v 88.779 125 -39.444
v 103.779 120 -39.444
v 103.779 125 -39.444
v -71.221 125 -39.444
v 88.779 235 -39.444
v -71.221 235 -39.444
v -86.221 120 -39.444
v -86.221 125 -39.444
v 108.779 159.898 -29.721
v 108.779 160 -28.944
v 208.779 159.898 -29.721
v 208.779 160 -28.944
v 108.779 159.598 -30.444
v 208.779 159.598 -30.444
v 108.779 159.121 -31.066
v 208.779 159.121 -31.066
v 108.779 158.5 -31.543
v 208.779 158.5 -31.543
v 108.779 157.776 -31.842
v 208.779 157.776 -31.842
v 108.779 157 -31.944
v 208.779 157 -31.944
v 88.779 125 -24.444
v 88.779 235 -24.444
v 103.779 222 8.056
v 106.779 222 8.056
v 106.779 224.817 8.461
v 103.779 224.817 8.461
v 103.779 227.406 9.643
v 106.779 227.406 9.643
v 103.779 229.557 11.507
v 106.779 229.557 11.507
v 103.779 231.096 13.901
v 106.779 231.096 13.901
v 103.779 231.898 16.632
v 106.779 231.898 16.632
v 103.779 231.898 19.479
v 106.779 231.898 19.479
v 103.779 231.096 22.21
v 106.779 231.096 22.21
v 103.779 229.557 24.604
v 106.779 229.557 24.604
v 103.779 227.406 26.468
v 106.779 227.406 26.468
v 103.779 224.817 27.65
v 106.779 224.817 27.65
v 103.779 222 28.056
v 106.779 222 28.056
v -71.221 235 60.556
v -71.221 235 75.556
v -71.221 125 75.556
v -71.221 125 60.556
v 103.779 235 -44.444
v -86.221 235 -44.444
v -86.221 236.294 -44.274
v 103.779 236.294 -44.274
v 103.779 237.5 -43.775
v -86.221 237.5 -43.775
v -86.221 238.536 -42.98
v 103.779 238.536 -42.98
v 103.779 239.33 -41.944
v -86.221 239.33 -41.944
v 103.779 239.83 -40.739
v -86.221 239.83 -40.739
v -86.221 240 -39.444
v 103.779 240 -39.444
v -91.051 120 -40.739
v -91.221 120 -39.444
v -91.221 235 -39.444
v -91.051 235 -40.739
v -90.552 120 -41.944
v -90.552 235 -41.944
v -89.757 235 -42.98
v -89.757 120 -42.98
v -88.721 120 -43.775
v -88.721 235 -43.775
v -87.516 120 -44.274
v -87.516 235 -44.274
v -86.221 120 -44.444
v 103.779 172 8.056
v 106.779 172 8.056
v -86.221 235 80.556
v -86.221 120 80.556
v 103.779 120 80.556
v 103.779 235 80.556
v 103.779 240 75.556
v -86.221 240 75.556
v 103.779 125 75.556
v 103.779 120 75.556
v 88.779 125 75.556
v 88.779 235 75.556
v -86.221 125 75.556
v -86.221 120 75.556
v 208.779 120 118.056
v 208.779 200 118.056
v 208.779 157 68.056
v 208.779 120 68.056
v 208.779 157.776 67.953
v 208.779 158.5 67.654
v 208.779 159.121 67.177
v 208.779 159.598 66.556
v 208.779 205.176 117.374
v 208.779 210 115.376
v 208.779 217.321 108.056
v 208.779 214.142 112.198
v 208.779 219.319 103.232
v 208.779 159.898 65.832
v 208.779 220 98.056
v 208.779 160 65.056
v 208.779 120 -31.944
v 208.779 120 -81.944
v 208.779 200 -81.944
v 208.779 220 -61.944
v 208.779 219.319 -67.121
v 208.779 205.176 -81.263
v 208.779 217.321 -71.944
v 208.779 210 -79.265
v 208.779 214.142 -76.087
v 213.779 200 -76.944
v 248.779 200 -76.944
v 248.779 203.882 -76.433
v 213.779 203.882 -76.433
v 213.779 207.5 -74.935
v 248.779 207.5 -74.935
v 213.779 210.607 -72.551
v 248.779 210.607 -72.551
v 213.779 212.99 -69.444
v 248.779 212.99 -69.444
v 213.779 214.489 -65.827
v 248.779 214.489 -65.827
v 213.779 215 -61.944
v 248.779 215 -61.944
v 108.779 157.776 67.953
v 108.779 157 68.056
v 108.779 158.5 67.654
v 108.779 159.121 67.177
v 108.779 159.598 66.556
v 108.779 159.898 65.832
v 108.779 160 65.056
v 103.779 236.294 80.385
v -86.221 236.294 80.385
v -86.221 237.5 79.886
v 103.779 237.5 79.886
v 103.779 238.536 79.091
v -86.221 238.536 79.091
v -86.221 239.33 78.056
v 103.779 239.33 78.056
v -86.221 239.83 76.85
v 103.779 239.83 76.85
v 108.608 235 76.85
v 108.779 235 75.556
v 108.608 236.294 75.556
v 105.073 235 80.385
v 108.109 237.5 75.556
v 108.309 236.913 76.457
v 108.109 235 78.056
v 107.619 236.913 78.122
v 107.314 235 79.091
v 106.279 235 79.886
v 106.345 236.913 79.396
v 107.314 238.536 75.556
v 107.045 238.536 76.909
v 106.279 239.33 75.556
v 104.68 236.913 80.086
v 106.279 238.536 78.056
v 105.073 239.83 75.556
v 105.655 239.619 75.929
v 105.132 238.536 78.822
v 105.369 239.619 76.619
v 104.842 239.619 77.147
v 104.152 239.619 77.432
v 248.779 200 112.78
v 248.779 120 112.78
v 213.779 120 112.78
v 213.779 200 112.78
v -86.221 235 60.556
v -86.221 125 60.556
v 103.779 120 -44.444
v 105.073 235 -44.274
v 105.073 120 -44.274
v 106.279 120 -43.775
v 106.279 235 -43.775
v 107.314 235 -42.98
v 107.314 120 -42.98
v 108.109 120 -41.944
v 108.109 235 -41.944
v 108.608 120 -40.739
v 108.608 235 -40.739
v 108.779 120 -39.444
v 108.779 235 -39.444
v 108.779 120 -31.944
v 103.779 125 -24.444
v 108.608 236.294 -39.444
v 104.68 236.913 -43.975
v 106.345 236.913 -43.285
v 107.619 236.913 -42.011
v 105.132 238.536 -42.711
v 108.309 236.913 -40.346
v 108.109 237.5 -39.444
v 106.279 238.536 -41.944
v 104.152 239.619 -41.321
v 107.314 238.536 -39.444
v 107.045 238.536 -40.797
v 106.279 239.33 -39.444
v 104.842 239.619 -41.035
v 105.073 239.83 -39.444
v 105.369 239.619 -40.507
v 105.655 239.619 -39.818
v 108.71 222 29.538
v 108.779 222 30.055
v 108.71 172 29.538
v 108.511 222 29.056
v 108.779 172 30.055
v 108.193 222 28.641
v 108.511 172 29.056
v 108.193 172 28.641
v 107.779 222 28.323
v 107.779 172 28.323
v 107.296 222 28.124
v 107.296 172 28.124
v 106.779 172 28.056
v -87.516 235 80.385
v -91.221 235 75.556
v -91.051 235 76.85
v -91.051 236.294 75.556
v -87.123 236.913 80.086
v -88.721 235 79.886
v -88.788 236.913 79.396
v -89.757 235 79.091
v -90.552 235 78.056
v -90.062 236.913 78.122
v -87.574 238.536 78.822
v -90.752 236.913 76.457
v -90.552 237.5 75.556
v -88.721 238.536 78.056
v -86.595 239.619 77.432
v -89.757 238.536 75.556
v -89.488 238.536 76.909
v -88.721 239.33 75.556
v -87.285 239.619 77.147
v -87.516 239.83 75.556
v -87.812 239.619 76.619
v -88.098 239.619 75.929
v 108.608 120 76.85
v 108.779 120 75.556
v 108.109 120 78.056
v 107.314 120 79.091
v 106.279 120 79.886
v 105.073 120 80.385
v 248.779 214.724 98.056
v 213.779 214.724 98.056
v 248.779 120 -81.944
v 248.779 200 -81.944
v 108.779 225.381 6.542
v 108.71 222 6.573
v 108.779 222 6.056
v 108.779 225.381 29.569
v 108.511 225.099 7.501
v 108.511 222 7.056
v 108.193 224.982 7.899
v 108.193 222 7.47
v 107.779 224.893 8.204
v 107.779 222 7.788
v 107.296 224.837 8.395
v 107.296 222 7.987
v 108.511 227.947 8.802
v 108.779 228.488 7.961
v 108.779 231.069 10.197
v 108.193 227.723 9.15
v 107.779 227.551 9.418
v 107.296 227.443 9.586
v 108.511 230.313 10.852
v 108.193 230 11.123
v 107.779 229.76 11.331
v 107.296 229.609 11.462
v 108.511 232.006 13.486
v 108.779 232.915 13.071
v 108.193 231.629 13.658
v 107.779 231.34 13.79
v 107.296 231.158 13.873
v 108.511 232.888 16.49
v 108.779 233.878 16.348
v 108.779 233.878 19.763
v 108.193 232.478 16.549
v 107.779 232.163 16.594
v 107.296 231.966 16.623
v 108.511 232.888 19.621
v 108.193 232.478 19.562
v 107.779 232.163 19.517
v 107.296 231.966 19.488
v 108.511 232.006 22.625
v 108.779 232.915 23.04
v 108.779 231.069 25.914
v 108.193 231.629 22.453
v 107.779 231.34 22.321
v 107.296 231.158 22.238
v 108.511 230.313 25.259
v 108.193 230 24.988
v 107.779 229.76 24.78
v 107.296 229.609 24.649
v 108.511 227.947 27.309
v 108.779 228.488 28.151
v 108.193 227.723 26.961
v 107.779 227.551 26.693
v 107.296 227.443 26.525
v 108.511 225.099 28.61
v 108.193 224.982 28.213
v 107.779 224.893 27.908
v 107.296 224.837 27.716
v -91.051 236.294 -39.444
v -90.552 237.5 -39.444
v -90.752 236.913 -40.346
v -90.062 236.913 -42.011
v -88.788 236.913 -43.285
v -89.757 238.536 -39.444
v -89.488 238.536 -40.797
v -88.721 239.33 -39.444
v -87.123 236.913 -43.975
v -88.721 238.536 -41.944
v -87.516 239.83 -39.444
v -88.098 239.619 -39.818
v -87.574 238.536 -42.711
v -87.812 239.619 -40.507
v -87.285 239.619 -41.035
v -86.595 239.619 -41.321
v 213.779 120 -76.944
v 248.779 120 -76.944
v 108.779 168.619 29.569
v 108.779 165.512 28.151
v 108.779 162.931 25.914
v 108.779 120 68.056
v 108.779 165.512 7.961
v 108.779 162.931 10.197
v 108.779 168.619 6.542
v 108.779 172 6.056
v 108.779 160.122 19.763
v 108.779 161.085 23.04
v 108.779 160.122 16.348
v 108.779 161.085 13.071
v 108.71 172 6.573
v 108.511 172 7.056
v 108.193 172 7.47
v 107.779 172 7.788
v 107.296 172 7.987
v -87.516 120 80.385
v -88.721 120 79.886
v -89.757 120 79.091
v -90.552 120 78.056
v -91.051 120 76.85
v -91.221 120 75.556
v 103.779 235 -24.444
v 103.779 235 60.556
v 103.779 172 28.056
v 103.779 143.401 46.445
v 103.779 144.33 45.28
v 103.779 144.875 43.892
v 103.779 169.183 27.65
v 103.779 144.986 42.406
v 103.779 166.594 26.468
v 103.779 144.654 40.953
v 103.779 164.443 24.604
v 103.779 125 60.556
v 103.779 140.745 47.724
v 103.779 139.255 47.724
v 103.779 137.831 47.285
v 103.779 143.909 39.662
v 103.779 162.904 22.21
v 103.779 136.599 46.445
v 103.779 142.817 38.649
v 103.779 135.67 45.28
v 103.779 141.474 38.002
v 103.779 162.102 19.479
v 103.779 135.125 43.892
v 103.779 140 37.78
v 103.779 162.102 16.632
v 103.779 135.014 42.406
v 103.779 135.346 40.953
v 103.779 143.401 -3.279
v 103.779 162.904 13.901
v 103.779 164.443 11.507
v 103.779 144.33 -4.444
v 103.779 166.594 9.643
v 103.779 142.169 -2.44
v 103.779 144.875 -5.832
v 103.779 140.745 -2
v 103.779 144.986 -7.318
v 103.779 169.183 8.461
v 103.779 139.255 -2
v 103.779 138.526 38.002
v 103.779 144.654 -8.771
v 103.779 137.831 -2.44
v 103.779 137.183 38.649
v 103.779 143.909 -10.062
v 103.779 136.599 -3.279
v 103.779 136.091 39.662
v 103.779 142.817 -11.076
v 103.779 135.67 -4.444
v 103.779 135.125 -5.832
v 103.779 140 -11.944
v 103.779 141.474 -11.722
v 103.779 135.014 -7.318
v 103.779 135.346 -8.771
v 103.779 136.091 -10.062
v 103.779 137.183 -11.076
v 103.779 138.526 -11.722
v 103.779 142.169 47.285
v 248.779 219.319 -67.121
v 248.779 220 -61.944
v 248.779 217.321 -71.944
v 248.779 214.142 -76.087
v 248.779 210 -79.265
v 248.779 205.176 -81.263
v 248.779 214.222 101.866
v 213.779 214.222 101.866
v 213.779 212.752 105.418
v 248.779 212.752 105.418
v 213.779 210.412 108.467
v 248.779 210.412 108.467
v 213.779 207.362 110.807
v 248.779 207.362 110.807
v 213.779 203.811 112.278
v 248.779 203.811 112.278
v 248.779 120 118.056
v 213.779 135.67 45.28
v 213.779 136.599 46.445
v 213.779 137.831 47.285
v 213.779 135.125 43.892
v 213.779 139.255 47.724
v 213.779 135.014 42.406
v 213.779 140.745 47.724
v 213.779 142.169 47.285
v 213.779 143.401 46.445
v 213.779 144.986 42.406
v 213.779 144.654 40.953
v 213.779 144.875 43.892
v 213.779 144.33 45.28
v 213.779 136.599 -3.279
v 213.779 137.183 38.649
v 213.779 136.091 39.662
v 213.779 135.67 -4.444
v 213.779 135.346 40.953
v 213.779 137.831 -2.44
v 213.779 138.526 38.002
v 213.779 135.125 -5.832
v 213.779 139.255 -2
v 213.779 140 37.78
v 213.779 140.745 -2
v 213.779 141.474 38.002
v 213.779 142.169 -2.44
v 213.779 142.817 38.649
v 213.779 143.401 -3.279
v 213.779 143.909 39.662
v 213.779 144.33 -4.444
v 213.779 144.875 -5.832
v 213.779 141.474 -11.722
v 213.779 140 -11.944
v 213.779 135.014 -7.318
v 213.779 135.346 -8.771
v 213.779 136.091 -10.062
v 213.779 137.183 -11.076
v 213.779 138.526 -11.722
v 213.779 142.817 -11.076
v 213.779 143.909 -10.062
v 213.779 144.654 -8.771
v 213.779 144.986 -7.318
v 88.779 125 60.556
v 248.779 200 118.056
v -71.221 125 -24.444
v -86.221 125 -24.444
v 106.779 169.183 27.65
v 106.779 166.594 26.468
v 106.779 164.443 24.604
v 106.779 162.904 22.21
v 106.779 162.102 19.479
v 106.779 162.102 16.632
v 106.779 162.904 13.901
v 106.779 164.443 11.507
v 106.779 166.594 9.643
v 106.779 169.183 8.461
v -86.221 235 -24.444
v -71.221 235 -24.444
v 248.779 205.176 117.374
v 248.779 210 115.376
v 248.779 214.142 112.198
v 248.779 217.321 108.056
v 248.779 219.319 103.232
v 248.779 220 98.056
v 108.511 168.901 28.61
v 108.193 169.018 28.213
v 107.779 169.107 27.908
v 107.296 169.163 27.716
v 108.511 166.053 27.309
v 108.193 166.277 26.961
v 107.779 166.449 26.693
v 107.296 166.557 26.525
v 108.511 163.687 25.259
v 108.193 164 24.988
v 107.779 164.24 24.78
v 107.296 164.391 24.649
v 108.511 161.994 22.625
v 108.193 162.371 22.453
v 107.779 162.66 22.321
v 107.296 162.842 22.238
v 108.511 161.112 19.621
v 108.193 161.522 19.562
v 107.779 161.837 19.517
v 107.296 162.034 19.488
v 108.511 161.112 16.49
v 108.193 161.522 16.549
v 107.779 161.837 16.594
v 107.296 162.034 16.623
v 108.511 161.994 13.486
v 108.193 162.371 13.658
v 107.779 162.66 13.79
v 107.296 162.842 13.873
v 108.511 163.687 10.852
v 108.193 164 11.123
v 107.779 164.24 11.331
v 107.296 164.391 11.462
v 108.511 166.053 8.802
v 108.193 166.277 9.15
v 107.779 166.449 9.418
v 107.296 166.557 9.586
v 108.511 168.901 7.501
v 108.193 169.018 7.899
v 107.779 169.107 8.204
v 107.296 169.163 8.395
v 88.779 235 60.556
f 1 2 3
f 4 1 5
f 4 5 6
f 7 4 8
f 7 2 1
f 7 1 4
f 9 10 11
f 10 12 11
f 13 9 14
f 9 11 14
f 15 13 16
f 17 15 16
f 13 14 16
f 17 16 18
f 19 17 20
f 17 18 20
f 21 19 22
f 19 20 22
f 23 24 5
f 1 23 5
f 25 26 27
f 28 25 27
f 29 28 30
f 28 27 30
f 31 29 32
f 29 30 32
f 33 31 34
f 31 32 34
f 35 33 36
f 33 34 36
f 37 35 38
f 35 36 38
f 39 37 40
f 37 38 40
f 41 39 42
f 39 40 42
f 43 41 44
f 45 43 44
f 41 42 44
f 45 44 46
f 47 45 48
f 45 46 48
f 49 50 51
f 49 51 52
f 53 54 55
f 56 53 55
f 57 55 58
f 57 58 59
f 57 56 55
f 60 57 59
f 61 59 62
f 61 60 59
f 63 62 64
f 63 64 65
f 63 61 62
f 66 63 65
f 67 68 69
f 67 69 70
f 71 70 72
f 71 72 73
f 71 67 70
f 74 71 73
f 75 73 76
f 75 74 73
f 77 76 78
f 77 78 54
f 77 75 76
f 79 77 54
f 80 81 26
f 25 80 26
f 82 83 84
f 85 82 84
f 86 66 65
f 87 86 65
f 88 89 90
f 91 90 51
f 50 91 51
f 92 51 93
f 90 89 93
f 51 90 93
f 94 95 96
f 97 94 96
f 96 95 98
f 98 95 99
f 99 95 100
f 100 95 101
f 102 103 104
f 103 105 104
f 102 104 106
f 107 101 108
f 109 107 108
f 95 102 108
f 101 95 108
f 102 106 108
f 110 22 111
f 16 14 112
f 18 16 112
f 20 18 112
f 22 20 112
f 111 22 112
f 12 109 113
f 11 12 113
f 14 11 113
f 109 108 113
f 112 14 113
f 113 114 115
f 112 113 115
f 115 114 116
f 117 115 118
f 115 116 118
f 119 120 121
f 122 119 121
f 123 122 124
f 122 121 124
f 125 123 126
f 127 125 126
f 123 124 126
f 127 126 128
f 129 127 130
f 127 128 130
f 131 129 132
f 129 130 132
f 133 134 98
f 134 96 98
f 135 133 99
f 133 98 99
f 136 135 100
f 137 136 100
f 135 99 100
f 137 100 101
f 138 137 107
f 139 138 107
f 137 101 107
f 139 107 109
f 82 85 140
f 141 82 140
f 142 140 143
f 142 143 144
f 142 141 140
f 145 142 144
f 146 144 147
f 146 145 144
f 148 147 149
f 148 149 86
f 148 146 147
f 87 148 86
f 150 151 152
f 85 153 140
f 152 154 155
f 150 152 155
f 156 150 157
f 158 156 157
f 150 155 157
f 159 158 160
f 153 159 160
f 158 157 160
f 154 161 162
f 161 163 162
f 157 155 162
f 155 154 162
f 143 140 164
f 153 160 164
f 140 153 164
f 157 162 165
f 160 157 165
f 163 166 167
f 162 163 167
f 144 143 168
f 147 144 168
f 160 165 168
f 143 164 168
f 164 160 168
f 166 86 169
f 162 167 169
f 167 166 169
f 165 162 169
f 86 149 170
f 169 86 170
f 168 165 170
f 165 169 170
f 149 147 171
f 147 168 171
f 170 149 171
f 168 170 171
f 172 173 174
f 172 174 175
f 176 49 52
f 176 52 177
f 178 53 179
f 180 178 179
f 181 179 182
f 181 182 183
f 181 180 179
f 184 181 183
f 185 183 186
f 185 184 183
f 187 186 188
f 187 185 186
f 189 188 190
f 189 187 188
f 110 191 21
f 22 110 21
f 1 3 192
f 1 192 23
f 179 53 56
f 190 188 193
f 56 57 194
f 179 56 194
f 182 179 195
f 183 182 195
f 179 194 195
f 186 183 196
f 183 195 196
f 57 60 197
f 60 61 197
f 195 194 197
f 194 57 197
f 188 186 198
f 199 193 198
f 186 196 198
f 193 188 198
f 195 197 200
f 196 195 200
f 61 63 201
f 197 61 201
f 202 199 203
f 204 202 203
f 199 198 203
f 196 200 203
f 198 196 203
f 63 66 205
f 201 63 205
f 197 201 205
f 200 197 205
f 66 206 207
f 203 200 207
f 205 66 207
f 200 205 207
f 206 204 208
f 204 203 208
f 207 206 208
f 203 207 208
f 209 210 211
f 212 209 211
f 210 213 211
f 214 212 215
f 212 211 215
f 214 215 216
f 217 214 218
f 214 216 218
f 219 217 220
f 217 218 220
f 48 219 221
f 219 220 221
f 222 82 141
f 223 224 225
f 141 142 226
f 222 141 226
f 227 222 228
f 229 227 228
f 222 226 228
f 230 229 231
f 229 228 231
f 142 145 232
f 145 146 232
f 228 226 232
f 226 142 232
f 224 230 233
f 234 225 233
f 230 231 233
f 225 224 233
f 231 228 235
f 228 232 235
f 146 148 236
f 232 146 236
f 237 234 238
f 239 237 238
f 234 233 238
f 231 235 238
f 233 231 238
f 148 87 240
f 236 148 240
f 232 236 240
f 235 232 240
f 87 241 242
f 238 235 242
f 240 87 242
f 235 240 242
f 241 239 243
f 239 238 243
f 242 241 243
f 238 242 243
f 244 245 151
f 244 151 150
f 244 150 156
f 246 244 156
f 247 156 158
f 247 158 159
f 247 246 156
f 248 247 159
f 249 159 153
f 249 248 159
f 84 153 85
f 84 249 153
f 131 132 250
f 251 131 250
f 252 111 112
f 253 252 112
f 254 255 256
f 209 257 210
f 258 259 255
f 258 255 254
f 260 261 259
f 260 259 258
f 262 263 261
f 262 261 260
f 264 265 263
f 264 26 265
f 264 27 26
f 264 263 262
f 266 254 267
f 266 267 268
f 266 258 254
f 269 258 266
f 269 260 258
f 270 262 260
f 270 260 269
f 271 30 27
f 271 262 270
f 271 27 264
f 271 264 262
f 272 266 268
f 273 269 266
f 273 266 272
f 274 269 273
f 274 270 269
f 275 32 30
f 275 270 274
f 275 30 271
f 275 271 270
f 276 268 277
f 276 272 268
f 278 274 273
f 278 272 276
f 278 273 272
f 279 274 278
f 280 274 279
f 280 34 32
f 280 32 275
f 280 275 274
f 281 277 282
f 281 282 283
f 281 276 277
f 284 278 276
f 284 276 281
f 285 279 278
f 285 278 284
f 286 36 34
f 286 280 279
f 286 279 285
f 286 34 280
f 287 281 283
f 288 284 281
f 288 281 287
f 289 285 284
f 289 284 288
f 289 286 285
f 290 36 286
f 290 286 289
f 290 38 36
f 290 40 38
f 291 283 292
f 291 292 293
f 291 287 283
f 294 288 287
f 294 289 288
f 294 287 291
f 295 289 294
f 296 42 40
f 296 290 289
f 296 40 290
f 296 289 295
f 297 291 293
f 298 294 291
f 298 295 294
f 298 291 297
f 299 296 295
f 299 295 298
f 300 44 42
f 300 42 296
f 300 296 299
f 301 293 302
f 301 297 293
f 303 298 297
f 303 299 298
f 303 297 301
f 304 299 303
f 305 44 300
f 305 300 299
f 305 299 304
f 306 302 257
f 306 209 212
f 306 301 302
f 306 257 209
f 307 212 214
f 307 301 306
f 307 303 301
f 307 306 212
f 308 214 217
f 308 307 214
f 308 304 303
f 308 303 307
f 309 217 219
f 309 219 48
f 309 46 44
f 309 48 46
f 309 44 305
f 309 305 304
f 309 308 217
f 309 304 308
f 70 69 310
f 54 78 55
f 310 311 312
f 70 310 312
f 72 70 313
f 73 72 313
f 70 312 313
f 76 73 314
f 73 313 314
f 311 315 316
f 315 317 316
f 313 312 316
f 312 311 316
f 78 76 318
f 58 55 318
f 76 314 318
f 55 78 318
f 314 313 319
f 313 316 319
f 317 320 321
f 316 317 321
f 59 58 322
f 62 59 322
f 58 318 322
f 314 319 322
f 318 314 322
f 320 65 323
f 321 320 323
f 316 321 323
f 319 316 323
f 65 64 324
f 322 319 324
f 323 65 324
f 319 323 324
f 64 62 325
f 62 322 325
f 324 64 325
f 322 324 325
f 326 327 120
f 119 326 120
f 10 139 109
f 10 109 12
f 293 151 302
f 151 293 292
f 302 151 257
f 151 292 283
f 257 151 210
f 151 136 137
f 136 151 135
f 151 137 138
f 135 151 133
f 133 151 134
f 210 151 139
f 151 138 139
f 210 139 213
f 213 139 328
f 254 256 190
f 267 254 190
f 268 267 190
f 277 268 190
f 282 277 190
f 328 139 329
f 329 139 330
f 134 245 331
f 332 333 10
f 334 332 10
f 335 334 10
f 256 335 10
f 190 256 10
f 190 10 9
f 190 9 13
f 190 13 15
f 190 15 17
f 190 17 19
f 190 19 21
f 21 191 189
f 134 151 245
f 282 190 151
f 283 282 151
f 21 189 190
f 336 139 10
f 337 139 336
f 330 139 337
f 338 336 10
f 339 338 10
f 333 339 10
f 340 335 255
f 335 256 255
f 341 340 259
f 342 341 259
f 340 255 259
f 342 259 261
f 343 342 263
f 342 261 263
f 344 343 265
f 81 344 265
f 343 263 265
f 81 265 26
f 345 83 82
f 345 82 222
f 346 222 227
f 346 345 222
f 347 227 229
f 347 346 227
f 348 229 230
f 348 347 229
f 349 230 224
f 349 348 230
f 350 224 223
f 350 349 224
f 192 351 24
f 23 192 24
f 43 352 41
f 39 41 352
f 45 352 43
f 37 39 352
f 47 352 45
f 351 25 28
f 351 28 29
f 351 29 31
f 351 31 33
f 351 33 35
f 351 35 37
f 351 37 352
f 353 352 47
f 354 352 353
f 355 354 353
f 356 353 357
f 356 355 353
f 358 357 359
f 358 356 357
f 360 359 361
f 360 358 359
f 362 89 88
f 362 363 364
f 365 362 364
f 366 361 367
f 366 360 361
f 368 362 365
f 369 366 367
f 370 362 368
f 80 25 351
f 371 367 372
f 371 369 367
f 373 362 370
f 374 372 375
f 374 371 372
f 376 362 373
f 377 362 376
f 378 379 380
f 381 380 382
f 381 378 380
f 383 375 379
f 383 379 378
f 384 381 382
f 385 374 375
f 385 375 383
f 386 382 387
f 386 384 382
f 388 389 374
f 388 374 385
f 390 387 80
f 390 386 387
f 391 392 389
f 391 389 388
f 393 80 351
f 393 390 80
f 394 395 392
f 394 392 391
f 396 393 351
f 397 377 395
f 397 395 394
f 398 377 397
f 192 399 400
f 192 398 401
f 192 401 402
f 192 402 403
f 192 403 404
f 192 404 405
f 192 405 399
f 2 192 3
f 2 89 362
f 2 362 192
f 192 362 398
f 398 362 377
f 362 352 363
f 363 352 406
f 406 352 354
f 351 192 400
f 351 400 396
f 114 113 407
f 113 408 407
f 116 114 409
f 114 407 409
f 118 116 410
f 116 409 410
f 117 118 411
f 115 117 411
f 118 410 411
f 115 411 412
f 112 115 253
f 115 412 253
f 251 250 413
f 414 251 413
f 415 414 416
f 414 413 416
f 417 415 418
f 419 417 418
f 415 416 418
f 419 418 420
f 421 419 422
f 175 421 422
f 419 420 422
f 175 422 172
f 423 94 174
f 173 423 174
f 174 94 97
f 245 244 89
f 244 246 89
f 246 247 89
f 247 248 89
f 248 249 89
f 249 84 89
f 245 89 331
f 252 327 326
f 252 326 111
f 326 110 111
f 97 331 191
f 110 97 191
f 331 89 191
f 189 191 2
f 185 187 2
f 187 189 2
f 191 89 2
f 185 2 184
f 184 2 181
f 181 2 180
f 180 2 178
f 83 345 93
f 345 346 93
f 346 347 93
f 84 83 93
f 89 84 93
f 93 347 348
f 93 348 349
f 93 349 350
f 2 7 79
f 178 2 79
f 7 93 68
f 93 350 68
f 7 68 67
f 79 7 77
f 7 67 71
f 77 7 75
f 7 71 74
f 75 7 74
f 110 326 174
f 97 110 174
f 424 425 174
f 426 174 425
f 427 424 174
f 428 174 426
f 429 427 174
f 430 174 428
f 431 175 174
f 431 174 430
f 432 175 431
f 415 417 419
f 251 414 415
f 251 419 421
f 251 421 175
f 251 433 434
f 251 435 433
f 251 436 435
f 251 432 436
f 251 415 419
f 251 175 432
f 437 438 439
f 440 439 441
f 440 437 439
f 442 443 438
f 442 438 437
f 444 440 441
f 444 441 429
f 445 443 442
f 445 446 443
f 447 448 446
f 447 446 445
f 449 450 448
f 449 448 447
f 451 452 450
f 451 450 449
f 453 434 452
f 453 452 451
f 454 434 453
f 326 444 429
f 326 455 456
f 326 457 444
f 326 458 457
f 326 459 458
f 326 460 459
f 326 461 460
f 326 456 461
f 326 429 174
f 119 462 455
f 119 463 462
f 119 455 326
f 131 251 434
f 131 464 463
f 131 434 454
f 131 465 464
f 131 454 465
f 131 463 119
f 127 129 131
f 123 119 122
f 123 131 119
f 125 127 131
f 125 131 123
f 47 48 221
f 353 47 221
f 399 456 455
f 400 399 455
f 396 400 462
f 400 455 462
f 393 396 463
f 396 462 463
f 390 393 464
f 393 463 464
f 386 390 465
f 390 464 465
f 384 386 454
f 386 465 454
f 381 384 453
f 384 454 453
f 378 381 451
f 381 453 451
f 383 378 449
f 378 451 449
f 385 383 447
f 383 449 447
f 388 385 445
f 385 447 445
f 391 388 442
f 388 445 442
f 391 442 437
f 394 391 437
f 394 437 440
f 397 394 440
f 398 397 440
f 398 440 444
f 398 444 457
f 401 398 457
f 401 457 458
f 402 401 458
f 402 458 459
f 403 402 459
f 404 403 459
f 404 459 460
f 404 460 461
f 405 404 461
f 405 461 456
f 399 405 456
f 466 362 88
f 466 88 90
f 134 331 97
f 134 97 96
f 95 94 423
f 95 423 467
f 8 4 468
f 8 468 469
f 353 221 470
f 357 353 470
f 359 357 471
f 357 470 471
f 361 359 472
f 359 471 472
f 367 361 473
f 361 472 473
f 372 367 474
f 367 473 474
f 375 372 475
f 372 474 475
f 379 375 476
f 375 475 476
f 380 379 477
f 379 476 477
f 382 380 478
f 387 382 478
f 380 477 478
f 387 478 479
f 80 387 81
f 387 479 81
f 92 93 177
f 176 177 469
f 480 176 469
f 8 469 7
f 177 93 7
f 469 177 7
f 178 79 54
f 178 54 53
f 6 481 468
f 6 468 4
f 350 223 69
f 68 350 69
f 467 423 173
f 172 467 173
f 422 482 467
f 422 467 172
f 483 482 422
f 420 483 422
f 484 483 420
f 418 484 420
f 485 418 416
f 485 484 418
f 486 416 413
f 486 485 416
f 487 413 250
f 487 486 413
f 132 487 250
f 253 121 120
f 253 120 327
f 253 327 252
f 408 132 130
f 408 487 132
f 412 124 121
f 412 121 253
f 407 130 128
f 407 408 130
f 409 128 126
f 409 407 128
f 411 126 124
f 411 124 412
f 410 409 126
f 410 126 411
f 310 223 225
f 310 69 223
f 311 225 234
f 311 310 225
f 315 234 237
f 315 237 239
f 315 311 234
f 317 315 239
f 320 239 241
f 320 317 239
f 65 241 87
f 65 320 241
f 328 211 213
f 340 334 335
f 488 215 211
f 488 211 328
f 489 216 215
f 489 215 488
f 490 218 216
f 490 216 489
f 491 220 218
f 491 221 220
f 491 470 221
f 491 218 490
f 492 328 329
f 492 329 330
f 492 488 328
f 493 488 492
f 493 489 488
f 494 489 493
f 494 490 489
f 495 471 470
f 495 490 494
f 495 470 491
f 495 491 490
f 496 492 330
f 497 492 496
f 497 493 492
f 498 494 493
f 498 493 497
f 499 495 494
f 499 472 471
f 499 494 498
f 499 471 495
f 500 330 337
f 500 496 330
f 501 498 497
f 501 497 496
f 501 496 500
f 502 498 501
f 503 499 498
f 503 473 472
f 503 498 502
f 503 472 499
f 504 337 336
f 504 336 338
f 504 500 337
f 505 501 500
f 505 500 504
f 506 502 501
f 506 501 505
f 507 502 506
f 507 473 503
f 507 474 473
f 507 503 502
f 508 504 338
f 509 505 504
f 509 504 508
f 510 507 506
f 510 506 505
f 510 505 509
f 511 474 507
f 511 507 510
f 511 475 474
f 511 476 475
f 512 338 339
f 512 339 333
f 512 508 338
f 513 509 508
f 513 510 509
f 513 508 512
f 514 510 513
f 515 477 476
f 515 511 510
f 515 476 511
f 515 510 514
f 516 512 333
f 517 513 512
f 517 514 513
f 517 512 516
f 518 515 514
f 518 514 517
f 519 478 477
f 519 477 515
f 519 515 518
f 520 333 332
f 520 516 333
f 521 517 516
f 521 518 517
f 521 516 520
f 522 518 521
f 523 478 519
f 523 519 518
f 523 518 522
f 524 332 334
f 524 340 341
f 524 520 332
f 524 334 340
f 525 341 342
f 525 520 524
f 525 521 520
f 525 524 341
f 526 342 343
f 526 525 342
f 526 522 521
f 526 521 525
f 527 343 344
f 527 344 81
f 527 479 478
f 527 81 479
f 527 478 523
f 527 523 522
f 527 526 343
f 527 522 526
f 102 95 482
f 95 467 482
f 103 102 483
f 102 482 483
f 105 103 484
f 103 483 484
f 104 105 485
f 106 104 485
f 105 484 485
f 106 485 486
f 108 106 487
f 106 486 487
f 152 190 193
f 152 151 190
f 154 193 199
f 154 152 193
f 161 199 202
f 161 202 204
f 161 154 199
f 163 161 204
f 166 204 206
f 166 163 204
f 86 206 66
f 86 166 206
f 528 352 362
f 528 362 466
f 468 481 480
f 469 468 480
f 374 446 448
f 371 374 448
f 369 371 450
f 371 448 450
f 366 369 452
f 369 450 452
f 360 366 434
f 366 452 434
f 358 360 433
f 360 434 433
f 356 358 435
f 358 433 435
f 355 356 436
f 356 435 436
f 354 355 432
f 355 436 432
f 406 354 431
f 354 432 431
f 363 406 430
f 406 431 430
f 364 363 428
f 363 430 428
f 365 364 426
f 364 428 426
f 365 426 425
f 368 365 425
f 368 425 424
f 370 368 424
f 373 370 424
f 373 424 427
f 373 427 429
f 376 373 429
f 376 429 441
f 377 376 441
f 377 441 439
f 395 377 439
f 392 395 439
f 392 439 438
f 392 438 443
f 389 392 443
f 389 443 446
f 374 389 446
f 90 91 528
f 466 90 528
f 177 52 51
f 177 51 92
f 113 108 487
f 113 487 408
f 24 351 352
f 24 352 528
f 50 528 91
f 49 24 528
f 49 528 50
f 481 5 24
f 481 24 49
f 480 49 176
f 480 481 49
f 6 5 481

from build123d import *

# Parameters (mm, degrees)
SKETCH1_W           = 200
SKETCH1_H           = 125
BOSS_EXTRUDE1_DEPTH = 120
BOSS_EXTRUDE2_DEPTH = 120
SKETCH3_W           = 200
SKETCH3_H           = 125
CUT_EXTRUDE1_DEPTH  = 120
FILLET1_R           = 5
SKETCH4_W           = 100
SKETCH4_H           = 40
BOSS_EXTRUDE3_DEPTH = 100
FILLET3_R           = 3
SKETCH5_W           = 190
SKETCH5_H           = 115
CUT_EXTRUDE2_DEPTH  = 115
SKETCH6_W           = 15
SKETCH6_H           = 15
BOSS_EXTRUDE4_DEPTH = 110
SKETCH7_W           = 200
SKETCH7_H           = 100
BOSS_EXTRUDE5_DEPTH = 40
FILLET4_R           = 20
SKETCH9_W           = 189.724209099
SKETCH9_H           = 80
CUT_EXTRUDE9_DEPTH  = 35
CUT_EXTRUDE10_DEPTH = 35
CUT_EXTRUDE11_DEPTH = 20
FILLET5_R           = 2
SKETCH11_R          = 5
CUT_EXTRUDE12_DEPTH = 132


with BuildPart() as part:
    # Sketch1 → Boss-Extrude1 (new body)
    with BuildSketch(Plane(origin=(0, 0, 0), x_dir=(1, 0, 0), z_dir=(0, 1, 0))):
        with Locations((8.778519755, -18.055555556)):
            Rectangle(SKETCH1_W, SKETCH1_H)
    extrude(amount=BOSS_EXTRUDE1_DEPTH)

    # Sketch2 → Boss-Extrude2 (add)
    with BuildSketch(Plane(origin=(0, 120, 0), x_dir=(1, 0, 0), z_dir=(0, 1, 0))):
        with BuildLine():
            Line((-86.221480245, 44.444444444), (103.778519755, 44.444444444))
            ThreePointArc((103.778519755, 44.444444444), (107.314053661, 42.97997835), (108.778519755, 39.444444444))
            Line((108.778519755, 39.444444444), (108.778519755, -75.555555556))
            ThreePointArc((108.778519755, -75.555555556), (107.314053661, -79.091089461), (103.778519755, -80.555555556))
            Line((103.778519755, -80.555555556), (-86.221480245, -80.555555556))
            ThreePointArc((-86.221480245, -80.555555556), (-89.757014151, -79.091089461), (-91.221480245, -75.555555556))
            Line((-91.221480245, -75.555555556), (-91.221480245, 39.444444444))
            ThreePointArc((-91.221480245, 39.444444444), (-89.757014151, 42.97997835), (-86.221480245, 44.444444444))
        make_face()
    extrude(amount=BOSS_EXTRUDE2_DEPTH)

    # Sketch3 → Cut-Extrude1 (cut)
    with BuildSketch(Plane(origin=(0, 0, 0), x_dir=(-1, 0, 0), z_dir=(0, -1, 0))):
        with Locations((-8.778519755, -18.055555556)):
            Rectangle(SKETCH3_W, SKETCH3_H)
    extrude(amount=-CUT_EXTRUDE1_DEPTH, mode=Mode.SUBTRACT)

    # Fillet1
    fillet1_edges = [part.edges().sort_by_distance(p)[0] for p in [
        (-89.757014151, 240, -42.97997835),
        (-91.221480245, 240, 18.055555556),
        (-89.757014151, 240, 79.091089461),
        (8.778519755, 240, 80.555555556),
        (107.314053661, 240, 79.091089461),
        (108.778519755, 240, 18.055555556),
        (107.314053661, 240, -42.97997835),
        (8.778519755, 240, -44.444444444),
    ]]
    fillet(fillet1_edges, radius=FILLET1_R)

    # Sketch4 → Boss-Extrude3 (add)
    with BuildSketch(Plane(origin=(108.778519755, 0, 0), x_dir=(0, 0, -1), z_dir=(1, 0, 0))):
        with Locations((-18.055555556, 140)):
            Rectangle(SKETCH4_W, SKETCH4_H)
    extrude(amount=BOSS_EXTRUDE3_DEPTH)

    # Fillet3
    fillet3_edges = [part.edges().sort_by_distance(p)[0] for p in [
        (158.778519755, 160, 68.055555556),
        (158.778519755, 160, -31.944444444),
    ]]
    fillet(fillet3_edges, radius=FILLET3_R)

    # Sketch5 → Cut-Extrude2 (cut)
    with BuildSketch(Plane(origin=(0, 120, 0), x_dir=(-1, 0, 0), z_dir=(0, -1, 0))):
        with Locations((-8.778519755, -18.055555556)):
            Rectangle(SKETCH5_W, SKETCH5_H)
    extrude(amount=-CUT_EXTRUDE2_DEPTH, mode=Mode.SUBTRACT)

    # Sketch6 → Boss-Extrude4 (add)
    with BuildSketch(Plane(origin=(0, 235, 0), x_dir=(-1, 0, 0), z_dir=(0, -1, 0))):
        with Locations((78.721480245, -68.055555556)):
            Rectangle(SKETCH6_W, SKETCH6_H)
        with Locations((-96.278519755, -68.055555556)):
            Rectangle(SKETCH6_W, SKETCH6_H)
        with Locations((-96.278519755, 31.944444444)):
            Rectangle(SKETCH6_W, SKETCH6_H)
        with Locations((78.721480245, 31.944444444)):
            Rectangle(SKETCH6_W, SKETCH6_H)
    extrude(amount=BOSS_EXTRUDE4_DEPTH)

    # Sketch7 → Boss-Extrude5 (add)
    with BuildSketch(Plane(origin=(208.778519755, 0, 0), x_dir=(0, 0, -1), z_dir=(1, 0, 0))):
        with Locations((-18.055555556, 170)):
            Rectangle(SKETCH7_W, SKETCH7_H)
    extrude(amount=BOSS_EXTRUDE5_DEPTH)

    # Fillet4
    fillet4_edges = [part.edges().sort_by_distance(p)[0] for p in [
        (228.778519755, 220, 118.055555556),
        (228.778519755, 220, -81.944444444),
    ]]
    fillet(fillet4_edges, radius=FILLET4_R)

    # Sketch9 → Cut-Extrude9 (cut)
    with BuildSketch(Plane(origin=(248.778519755, 0, 0), x_dir=(0, 0, -1), z_dir=(1, 0, 0))):
        with Locations((-17.917660106, 160)):
            Rectangle(SKETCH9_W, SKETCH9_H)
    extrude(amount=-CUT_EXTRUDE9_DEPTH, mode=Mode.SUBTRACT)

    # Sketch9<3> → Cut-Extrude10 (cut)
    with BuildSketch(Plane(origin=(248.778519755, 0, 0), x_dir=(0, 0, -1), z_dir=(1, 0, 0))):
        with BuildLine():
            Line((-112.779764655, 200), (76.944444444, 200))
            ThreePointArc((76.944444444, 200), (72.551046162, 210.606601718), (61.944444444, 215))
            Line((61.944444444, 215), (-98.055555556, 214.7242091))
            ThreePointArc((-98.055555556, 214.7242091), (-108.467143658, 210.411588102), (-112.779764655, 200))
        make_face()
    extrude(amount=-CUT_EXTRUDE10_DEPTH, mode=Mode.SUBTRACT)

    # Sketch10 → Cut-Extrude11 (cut)
    with BuildSketch(Plane(origin=(108.778519755, 0, 0), x_dir=(0, 0, -1), z_dir=(1, 0, 0))):
        with BuildLine():
            Line((-28.055555556, 222), (-28.055555556, 172))
            ThreePointArc((-28.055555556, 172), (-18.055555556, 162), (-8.055555556, 172))
            Line((-8.055555556, 172), (-8.055555556, 222))
            ThreePointArc((-8.055555556, 222), (-18.055555556, 232), (-28.055555556, 222))
        make_face()
    extrude(amount=-CUT_EXTRUDE11_DEPTH, mode=Mode.SUBTRACT)

    # Fillet5
    fillet5_edges = [part.edges().sort_by_distance(p)[0] for p in [
        (108.778519755, 232, 18.055555556),
        (108.778519755, 197, 28.055555556),
        (108.778519755, 162, 18.055555556),
        (108.778519755, 197, 8.055555556),
    ]]
    fillet(fillet5_edges, radius=FILLET5_R - 0.0001)  # a hair under: the kernel refuses the full size

    # Sketch11 → Cut-Extrude12 (cut)
    with BuildSketch(Plane(origin=(213.778519755, 0, 0), x_dir=(0, 0, -1), z_dir=(1, 0, 0))):
        with Locations((-42.779764655, 140)):
            Circle(SKETCH11_R)
        with Locations((6.944444444, 140)):
            Circle(SKETCH11_R)
    extrude(amount=-CUT_EXTRUDE12_DEPTH, mode=Mode.SUBTRACT)


solid = part.part
